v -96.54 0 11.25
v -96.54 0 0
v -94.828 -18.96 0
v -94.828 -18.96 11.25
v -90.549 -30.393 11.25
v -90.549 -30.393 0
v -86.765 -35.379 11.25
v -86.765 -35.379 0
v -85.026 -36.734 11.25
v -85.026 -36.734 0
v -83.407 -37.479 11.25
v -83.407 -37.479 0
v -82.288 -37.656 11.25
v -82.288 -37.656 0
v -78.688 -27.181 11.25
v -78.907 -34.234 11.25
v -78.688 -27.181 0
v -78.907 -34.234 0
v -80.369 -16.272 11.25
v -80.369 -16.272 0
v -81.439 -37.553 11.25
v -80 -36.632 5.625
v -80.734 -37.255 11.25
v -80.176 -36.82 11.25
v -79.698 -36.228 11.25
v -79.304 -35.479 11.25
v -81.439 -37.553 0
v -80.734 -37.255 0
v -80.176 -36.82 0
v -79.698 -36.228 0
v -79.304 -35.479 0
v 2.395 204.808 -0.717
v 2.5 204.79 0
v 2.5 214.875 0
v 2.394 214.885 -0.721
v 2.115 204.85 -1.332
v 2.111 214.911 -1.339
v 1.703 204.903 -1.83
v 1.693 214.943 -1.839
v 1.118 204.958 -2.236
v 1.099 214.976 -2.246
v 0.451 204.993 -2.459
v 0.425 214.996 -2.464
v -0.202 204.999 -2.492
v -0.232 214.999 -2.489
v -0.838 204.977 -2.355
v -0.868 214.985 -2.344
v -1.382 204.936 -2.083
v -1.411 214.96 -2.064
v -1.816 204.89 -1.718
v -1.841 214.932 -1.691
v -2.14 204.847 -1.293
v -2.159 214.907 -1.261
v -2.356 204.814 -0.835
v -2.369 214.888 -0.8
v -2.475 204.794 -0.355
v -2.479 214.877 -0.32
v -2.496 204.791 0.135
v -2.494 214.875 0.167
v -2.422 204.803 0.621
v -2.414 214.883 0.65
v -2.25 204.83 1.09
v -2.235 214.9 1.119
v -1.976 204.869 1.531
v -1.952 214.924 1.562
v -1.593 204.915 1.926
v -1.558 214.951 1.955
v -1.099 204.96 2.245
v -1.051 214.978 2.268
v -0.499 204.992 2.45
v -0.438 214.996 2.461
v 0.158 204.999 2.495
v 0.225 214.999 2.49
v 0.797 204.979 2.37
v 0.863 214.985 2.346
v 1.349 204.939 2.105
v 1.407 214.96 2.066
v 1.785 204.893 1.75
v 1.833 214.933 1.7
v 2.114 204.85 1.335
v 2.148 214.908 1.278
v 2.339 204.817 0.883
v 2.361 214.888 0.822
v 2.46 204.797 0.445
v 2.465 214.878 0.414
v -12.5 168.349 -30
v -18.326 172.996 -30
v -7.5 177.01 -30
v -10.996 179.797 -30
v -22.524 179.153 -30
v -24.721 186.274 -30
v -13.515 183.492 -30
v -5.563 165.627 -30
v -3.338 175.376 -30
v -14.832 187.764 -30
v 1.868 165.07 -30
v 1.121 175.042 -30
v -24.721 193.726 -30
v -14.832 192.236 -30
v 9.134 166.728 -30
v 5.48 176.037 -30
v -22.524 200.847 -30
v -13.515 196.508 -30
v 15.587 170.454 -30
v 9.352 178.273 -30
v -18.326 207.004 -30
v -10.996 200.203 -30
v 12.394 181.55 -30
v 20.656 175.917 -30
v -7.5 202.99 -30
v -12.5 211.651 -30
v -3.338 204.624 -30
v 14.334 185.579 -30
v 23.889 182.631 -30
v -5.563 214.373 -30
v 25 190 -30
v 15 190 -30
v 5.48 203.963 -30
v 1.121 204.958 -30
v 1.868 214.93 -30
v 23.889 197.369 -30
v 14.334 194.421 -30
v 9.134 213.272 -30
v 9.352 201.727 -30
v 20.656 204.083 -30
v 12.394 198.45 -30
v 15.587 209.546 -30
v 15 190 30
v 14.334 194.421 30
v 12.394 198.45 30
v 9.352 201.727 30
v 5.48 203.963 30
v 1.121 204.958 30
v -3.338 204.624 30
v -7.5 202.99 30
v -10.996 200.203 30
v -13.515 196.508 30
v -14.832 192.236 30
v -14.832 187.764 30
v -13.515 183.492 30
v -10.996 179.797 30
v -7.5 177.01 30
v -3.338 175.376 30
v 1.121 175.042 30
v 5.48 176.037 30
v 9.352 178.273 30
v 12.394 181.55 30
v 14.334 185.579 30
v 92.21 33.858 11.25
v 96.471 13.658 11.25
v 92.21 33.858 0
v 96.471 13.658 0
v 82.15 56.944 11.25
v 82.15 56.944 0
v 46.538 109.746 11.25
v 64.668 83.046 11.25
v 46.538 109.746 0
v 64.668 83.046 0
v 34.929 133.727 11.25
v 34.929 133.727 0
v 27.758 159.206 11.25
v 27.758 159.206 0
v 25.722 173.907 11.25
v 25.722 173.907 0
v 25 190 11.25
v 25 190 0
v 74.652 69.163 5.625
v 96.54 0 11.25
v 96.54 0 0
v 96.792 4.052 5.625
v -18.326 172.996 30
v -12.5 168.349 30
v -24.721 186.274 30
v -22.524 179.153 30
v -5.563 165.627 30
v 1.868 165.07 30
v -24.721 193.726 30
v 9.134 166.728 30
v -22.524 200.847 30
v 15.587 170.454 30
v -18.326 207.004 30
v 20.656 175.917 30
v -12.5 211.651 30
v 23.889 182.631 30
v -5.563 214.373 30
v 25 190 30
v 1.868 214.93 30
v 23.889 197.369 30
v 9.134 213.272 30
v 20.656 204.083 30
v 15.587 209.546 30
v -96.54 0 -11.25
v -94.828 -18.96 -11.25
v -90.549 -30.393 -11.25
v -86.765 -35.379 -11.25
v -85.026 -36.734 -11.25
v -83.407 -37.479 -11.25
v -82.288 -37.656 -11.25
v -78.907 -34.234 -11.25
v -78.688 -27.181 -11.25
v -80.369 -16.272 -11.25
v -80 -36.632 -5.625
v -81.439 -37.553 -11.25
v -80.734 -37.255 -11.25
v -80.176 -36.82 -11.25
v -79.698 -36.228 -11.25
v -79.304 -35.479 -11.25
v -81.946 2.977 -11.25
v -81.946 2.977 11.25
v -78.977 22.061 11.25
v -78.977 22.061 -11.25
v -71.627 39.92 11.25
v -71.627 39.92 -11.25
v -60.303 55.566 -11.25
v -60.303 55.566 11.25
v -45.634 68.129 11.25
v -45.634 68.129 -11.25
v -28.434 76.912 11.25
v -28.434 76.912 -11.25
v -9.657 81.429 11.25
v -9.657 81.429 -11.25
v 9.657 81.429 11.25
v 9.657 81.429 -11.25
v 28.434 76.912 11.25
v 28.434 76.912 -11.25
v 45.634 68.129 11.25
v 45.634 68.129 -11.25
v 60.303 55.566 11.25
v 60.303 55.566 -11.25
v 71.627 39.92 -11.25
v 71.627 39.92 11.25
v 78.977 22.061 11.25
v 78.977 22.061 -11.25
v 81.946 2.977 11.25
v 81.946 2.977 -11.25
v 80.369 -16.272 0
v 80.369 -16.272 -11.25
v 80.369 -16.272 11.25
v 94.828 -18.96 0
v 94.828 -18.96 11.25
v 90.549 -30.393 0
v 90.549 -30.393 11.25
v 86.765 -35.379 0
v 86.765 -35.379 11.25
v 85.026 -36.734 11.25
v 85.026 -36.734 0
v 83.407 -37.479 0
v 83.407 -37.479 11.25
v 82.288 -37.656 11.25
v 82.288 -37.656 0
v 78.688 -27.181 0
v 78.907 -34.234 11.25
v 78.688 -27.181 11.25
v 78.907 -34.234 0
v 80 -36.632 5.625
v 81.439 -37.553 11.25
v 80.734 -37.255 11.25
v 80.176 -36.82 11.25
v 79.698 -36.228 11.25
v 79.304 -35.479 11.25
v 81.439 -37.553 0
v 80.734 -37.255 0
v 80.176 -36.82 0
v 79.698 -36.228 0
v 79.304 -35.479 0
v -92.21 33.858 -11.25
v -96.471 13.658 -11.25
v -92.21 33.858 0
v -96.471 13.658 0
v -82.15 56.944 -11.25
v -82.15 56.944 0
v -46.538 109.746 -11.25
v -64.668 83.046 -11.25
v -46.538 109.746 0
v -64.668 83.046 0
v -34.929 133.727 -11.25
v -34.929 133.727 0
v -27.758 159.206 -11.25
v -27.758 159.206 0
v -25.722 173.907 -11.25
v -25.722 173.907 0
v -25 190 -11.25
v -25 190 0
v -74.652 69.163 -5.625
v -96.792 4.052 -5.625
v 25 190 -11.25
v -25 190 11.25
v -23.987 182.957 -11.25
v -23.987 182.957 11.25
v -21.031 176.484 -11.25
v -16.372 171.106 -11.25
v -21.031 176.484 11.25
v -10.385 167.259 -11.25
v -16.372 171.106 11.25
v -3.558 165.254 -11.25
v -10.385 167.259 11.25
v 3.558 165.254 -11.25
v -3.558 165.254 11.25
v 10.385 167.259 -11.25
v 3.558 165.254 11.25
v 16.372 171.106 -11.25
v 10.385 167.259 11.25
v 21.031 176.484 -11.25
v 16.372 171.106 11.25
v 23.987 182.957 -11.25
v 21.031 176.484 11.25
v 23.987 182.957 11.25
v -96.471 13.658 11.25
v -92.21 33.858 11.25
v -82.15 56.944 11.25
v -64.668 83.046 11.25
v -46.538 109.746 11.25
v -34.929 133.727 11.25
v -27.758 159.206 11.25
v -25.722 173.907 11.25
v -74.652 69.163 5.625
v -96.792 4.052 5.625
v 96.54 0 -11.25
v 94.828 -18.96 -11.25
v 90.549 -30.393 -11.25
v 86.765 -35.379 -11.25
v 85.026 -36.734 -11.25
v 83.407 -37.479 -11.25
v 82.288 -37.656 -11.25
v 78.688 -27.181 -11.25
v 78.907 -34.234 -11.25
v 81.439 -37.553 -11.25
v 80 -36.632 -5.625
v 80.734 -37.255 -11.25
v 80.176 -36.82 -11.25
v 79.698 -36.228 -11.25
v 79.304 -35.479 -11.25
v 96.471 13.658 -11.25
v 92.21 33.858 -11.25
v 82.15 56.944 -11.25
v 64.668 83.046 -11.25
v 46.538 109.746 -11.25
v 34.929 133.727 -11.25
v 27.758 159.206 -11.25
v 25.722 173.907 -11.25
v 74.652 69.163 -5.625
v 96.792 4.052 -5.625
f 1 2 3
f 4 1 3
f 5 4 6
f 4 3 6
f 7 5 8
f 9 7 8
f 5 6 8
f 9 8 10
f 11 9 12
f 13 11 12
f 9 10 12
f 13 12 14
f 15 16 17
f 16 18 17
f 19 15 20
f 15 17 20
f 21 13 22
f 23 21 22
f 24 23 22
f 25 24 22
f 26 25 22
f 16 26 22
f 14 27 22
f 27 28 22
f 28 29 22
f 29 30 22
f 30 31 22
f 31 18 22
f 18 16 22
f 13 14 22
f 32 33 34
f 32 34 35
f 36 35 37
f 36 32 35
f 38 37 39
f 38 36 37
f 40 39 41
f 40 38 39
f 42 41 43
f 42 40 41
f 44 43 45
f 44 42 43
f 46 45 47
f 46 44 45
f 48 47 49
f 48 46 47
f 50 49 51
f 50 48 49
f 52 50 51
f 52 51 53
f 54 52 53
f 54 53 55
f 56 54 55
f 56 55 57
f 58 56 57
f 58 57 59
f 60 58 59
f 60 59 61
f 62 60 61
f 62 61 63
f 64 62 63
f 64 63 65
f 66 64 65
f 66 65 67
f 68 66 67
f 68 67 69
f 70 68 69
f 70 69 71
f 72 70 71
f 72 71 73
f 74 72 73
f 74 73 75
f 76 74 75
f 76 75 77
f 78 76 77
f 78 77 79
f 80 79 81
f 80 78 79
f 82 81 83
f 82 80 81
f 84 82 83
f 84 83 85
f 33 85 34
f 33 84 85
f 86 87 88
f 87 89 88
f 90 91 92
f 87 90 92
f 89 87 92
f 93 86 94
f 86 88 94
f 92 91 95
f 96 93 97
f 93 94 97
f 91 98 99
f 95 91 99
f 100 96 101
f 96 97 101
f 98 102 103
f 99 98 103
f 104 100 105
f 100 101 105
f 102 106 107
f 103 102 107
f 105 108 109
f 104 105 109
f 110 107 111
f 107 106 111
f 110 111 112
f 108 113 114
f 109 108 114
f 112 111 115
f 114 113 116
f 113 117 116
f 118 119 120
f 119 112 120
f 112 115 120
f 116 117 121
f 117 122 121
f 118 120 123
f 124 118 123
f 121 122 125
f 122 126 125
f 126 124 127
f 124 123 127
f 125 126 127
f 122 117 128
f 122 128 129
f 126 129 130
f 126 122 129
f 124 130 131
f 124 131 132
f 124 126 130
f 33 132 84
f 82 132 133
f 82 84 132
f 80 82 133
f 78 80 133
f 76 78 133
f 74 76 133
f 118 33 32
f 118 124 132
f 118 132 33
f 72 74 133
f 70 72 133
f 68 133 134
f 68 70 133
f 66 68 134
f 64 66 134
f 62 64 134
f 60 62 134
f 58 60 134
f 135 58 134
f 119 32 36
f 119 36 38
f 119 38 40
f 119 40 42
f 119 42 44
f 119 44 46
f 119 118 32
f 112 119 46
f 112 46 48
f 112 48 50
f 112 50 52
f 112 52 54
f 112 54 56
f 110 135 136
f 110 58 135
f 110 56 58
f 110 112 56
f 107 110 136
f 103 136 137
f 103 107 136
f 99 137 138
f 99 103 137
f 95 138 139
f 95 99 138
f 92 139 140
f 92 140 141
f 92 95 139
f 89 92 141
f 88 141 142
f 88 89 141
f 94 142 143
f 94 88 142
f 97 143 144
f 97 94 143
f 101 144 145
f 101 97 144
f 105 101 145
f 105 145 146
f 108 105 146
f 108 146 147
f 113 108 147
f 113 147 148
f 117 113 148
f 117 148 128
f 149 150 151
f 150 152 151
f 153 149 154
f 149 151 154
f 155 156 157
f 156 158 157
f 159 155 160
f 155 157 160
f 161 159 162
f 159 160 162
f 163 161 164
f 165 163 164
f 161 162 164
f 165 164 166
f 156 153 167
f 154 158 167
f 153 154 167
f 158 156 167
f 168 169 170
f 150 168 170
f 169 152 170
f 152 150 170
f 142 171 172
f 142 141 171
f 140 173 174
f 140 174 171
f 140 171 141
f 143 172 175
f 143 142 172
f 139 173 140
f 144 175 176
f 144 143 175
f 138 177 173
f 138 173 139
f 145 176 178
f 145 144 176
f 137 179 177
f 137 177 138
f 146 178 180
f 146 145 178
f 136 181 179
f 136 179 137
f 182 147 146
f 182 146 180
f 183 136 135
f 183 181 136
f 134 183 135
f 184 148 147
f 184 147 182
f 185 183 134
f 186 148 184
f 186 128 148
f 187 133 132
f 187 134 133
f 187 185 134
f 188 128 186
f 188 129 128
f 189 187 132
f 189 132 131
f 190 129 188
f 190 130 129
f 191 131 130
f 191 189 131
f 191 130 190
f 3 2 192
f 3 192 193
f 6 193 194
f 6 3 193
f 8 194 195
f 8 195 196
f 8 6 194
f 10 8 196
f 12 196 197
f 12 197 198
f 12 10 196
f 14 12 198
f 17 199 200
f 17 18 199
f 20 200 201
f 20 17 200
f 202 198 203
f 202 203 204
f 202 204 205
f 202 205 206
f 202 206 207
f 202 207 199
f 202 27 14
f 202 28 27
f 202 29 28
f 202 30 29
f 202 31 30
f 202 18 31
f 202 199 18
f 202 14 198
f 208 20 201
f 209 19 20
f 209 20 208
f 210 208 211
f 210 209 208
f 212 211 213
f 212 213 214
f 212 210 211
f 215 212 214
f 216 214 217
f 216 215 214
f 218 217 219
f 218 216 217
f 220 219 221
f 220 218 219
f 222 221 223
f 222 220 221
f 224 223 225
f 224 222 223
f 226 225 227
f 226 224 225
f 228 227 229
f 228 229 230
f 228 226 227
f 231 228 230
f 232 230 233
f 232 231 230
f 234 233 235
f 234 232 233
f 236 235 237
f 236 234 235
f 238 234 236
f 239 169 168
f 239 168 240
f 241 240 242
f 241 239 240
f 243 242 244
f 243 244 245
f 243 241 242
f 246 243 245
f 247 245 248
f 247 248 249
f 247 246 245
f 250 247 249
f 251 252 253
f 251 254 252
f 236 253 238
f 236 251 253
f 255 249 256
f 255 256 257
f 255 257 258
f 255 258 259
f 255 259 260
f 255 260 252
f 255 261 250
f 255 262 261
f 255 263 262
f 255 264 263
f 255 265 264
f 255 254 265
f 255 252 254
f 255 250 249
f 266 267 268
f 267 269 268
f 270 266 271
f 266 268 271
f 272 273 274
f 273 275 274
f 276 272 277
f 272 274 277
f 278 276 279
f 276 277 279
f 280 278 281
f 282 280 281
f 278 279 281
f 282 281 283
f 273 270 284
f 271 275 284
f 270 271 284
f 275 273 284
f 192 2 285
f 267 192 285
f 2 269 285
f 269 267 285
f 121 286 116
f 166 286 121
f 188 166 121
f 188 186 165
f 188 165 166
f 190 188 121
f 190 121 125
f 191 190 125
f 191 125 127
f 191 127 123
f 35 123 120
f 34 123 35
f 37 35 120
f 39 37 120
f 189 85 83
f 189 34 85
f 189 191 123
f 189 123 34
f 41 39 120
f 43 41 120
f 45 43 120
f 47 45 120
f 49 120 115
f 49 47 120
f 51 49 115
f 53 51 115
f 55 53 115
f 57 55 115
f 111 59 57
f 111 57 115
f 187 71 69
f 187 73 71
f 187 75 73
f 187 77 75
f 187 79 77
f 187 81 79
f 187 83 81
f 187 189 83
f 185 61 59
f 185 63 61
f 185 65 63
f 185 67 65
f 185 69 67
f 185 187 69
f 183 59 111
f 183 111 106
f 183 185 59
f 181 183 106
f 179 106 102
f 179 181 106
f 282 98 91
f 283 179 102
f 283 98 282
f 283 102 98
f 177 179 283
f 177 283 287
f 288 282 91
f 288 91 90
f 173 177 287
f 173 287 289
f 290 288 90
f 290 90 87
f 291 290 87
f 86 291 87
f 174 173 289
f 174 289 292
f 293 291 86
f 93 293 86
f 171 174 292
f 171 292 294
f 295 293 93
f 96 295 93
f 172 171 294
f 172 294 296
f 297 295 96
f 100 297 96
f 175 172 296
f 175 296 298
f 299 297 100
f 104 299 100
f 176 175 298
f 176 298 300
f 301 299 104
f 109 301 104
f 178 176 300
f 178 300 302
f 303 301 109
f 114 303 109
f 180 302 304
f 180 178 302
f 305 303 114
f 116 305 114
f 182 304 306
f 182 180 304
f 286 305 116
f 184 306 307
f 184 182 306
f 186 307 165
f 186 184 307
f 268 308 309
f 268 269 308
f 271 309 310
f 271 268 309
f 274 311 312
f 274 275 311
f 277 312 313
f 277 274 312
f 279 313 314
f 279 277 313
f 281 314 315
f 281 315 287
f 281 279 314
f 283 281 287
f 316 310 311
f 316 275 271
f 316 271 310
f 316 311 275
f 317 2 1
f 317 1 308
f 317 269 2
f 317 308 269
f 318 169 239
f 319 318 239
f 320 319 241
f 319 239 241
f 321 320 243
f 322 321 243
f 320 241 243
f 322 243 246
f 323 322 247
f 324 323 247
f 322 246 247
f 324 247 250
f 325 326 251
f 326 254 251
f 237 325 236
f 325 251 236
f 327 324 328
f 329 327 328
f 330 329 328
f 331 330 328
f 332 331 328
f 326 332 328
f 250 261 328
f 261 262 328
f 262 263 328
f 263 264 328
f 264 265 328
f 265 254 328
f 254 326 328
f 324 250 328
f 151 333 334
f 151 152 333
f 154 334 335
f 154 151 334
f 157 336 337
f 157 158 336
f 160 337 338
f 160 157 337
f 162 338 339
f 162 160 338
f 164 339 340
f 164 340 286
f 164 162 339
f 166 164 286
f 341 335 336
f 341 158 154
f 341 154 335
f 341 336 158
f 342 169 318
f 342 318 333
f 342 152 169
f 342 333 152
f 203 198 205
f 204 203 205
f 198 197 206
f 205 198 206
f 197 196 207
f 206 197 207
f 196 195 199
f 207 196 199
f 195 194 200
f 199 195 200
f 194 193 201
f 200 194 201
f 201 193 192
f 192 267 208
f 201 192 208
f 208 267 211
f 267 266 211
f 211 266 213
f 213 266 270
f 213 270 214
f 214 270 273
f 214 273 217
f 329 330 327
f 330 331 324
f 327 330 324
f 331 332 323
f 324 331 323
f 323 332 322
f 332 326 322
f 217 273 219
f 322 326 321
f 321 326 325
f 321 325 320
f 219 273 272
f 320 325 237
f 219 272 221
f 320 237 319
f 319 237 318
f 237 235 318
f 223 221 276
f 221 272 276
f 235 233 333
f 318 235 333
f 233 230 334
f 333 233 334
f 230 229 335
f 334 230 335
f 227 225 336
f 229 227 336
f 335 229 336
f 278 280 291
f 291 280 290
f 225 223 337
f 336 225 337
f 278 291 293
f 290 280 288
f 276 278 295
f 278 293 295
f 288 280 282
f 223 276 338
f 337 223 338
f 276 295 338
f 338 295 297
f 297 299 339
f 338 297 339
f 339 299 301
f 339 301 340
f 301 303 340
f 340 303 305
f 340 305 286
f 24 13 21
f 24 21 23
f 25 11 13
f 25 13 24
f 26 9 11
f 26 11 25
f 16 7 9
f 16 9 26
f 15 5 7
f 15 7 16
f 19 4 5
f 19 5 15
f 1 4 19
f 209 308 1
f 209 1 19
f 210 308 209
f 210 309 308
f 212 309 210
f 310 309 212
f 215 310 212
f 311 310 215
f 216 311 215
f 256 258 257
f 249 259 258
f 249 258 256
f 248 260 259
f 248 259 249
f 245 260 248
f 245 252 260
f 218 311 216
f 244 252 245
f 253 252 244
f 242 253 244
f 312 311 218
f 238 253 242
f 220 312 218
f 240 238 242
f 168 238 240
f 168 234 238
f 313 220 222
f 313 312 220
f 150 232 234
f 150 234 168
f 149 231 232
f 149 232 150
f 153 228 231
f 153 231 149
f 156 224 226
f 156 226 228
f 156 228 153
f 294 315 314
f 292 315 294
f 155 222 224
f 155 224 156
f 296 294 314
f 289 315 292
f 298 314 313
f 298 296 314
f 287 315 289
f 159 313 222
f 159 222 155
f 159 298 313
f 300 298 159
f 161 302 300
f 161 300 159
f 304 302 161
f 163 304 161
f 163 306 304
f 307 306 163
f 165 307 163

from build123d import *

# Parameters (mm, degrees)
BOSS_EXTRUDE1_DEPTH = 11.25
SKETCH1_3_R         = 25
SKETCH1_3_R_2       = 15
BOSS_EXTRUDE2_DEPTH = 30
SKETCH3_R           = 2.5
CUT_EXTRUDE1_DEPTH  = 36


with BuildPart() as part:
    # Sketch1 → Boss-Extrude1 (new body, symmetric)
    with BuildSketch(Plane.XY):
        with BuildLine():
            ThreePointArc((-80.369346148, -16.271699348), (0, 82), (80.369346148, -16.271699348))
            add(Edge.make_bspline(
                [(96.539745155, 0), (97.326558939, -29.331535134), (77.473492013, -47.573942745), (78.112479352, -27.418839229), (80.369346148, -16.271699348)],
                knots=[0, 0, 0, 0, 0.663724029, 1, 1, 1, 1], degree=3))
            add(Edge.make_bspline(
                [(96.539745155, 0), (96.493331912, 1.730233625), (104.346209234, 48.769492673), (25, 126.848420751), (25, 190)],
                knots=[0, 0, 0, 0, 0.598565743, 1, 1, 1, 1], degree=3))
            ThreePointArc((25, 190), (0, 165), (-25, 190))
            add(Edge.make_bspline(
                [(-96.539745155, 0), (-96.493331912, 1.730233625), (-104.346209234, 48.769492673), (-25, 126.848420751), (-25, 190)],
                knots=[0, 0, 0, 0, 0.598565743, 1, 1, 1, 1], degree=3))
            add(Edge.make_bspline(
                [(-96.539745155, 0), (-97.326558939, -29.331535134), (-77.473492013, -47.573942745), (-78.112479352, -27.418839229), (-80.369346148, -16.271699348)],
                knots=[0, 0, 0, 0, 0.663724029, 1, 1, 1, 1], degree=3))
        make_face()
    extrude(amount=BOSS_EXTRUDE1_DEPTH, both=True)

    # Sketch1<3> → Boss-Extrude2 (add, symmetric)
    with BuildSketch(Plane.XY):
        with Locations((0, 190)):
            Circle(SKETCH1_3_R)
        with Locations((0, 190)):
            Circle(SKETCH1_3_R_2, mode=Mode.SUBTRACT)
    extrude(amount=BOSS_EXTRUDE2_DEPTH, both=True)

    # Sketch3 → Cut-Extrude1 (cut, through all)
    with BuildSketch(Plane(origin=(0, 180, 0), x_dir=(1, 0, 0), z_dir=(0, 1, 0))):
        Circle(SKETCH3_R)
    extrude(amount=CUT_EXTRUDE1_DEPTH, mode=Mode.SUBTRACT)


solid = part.part
